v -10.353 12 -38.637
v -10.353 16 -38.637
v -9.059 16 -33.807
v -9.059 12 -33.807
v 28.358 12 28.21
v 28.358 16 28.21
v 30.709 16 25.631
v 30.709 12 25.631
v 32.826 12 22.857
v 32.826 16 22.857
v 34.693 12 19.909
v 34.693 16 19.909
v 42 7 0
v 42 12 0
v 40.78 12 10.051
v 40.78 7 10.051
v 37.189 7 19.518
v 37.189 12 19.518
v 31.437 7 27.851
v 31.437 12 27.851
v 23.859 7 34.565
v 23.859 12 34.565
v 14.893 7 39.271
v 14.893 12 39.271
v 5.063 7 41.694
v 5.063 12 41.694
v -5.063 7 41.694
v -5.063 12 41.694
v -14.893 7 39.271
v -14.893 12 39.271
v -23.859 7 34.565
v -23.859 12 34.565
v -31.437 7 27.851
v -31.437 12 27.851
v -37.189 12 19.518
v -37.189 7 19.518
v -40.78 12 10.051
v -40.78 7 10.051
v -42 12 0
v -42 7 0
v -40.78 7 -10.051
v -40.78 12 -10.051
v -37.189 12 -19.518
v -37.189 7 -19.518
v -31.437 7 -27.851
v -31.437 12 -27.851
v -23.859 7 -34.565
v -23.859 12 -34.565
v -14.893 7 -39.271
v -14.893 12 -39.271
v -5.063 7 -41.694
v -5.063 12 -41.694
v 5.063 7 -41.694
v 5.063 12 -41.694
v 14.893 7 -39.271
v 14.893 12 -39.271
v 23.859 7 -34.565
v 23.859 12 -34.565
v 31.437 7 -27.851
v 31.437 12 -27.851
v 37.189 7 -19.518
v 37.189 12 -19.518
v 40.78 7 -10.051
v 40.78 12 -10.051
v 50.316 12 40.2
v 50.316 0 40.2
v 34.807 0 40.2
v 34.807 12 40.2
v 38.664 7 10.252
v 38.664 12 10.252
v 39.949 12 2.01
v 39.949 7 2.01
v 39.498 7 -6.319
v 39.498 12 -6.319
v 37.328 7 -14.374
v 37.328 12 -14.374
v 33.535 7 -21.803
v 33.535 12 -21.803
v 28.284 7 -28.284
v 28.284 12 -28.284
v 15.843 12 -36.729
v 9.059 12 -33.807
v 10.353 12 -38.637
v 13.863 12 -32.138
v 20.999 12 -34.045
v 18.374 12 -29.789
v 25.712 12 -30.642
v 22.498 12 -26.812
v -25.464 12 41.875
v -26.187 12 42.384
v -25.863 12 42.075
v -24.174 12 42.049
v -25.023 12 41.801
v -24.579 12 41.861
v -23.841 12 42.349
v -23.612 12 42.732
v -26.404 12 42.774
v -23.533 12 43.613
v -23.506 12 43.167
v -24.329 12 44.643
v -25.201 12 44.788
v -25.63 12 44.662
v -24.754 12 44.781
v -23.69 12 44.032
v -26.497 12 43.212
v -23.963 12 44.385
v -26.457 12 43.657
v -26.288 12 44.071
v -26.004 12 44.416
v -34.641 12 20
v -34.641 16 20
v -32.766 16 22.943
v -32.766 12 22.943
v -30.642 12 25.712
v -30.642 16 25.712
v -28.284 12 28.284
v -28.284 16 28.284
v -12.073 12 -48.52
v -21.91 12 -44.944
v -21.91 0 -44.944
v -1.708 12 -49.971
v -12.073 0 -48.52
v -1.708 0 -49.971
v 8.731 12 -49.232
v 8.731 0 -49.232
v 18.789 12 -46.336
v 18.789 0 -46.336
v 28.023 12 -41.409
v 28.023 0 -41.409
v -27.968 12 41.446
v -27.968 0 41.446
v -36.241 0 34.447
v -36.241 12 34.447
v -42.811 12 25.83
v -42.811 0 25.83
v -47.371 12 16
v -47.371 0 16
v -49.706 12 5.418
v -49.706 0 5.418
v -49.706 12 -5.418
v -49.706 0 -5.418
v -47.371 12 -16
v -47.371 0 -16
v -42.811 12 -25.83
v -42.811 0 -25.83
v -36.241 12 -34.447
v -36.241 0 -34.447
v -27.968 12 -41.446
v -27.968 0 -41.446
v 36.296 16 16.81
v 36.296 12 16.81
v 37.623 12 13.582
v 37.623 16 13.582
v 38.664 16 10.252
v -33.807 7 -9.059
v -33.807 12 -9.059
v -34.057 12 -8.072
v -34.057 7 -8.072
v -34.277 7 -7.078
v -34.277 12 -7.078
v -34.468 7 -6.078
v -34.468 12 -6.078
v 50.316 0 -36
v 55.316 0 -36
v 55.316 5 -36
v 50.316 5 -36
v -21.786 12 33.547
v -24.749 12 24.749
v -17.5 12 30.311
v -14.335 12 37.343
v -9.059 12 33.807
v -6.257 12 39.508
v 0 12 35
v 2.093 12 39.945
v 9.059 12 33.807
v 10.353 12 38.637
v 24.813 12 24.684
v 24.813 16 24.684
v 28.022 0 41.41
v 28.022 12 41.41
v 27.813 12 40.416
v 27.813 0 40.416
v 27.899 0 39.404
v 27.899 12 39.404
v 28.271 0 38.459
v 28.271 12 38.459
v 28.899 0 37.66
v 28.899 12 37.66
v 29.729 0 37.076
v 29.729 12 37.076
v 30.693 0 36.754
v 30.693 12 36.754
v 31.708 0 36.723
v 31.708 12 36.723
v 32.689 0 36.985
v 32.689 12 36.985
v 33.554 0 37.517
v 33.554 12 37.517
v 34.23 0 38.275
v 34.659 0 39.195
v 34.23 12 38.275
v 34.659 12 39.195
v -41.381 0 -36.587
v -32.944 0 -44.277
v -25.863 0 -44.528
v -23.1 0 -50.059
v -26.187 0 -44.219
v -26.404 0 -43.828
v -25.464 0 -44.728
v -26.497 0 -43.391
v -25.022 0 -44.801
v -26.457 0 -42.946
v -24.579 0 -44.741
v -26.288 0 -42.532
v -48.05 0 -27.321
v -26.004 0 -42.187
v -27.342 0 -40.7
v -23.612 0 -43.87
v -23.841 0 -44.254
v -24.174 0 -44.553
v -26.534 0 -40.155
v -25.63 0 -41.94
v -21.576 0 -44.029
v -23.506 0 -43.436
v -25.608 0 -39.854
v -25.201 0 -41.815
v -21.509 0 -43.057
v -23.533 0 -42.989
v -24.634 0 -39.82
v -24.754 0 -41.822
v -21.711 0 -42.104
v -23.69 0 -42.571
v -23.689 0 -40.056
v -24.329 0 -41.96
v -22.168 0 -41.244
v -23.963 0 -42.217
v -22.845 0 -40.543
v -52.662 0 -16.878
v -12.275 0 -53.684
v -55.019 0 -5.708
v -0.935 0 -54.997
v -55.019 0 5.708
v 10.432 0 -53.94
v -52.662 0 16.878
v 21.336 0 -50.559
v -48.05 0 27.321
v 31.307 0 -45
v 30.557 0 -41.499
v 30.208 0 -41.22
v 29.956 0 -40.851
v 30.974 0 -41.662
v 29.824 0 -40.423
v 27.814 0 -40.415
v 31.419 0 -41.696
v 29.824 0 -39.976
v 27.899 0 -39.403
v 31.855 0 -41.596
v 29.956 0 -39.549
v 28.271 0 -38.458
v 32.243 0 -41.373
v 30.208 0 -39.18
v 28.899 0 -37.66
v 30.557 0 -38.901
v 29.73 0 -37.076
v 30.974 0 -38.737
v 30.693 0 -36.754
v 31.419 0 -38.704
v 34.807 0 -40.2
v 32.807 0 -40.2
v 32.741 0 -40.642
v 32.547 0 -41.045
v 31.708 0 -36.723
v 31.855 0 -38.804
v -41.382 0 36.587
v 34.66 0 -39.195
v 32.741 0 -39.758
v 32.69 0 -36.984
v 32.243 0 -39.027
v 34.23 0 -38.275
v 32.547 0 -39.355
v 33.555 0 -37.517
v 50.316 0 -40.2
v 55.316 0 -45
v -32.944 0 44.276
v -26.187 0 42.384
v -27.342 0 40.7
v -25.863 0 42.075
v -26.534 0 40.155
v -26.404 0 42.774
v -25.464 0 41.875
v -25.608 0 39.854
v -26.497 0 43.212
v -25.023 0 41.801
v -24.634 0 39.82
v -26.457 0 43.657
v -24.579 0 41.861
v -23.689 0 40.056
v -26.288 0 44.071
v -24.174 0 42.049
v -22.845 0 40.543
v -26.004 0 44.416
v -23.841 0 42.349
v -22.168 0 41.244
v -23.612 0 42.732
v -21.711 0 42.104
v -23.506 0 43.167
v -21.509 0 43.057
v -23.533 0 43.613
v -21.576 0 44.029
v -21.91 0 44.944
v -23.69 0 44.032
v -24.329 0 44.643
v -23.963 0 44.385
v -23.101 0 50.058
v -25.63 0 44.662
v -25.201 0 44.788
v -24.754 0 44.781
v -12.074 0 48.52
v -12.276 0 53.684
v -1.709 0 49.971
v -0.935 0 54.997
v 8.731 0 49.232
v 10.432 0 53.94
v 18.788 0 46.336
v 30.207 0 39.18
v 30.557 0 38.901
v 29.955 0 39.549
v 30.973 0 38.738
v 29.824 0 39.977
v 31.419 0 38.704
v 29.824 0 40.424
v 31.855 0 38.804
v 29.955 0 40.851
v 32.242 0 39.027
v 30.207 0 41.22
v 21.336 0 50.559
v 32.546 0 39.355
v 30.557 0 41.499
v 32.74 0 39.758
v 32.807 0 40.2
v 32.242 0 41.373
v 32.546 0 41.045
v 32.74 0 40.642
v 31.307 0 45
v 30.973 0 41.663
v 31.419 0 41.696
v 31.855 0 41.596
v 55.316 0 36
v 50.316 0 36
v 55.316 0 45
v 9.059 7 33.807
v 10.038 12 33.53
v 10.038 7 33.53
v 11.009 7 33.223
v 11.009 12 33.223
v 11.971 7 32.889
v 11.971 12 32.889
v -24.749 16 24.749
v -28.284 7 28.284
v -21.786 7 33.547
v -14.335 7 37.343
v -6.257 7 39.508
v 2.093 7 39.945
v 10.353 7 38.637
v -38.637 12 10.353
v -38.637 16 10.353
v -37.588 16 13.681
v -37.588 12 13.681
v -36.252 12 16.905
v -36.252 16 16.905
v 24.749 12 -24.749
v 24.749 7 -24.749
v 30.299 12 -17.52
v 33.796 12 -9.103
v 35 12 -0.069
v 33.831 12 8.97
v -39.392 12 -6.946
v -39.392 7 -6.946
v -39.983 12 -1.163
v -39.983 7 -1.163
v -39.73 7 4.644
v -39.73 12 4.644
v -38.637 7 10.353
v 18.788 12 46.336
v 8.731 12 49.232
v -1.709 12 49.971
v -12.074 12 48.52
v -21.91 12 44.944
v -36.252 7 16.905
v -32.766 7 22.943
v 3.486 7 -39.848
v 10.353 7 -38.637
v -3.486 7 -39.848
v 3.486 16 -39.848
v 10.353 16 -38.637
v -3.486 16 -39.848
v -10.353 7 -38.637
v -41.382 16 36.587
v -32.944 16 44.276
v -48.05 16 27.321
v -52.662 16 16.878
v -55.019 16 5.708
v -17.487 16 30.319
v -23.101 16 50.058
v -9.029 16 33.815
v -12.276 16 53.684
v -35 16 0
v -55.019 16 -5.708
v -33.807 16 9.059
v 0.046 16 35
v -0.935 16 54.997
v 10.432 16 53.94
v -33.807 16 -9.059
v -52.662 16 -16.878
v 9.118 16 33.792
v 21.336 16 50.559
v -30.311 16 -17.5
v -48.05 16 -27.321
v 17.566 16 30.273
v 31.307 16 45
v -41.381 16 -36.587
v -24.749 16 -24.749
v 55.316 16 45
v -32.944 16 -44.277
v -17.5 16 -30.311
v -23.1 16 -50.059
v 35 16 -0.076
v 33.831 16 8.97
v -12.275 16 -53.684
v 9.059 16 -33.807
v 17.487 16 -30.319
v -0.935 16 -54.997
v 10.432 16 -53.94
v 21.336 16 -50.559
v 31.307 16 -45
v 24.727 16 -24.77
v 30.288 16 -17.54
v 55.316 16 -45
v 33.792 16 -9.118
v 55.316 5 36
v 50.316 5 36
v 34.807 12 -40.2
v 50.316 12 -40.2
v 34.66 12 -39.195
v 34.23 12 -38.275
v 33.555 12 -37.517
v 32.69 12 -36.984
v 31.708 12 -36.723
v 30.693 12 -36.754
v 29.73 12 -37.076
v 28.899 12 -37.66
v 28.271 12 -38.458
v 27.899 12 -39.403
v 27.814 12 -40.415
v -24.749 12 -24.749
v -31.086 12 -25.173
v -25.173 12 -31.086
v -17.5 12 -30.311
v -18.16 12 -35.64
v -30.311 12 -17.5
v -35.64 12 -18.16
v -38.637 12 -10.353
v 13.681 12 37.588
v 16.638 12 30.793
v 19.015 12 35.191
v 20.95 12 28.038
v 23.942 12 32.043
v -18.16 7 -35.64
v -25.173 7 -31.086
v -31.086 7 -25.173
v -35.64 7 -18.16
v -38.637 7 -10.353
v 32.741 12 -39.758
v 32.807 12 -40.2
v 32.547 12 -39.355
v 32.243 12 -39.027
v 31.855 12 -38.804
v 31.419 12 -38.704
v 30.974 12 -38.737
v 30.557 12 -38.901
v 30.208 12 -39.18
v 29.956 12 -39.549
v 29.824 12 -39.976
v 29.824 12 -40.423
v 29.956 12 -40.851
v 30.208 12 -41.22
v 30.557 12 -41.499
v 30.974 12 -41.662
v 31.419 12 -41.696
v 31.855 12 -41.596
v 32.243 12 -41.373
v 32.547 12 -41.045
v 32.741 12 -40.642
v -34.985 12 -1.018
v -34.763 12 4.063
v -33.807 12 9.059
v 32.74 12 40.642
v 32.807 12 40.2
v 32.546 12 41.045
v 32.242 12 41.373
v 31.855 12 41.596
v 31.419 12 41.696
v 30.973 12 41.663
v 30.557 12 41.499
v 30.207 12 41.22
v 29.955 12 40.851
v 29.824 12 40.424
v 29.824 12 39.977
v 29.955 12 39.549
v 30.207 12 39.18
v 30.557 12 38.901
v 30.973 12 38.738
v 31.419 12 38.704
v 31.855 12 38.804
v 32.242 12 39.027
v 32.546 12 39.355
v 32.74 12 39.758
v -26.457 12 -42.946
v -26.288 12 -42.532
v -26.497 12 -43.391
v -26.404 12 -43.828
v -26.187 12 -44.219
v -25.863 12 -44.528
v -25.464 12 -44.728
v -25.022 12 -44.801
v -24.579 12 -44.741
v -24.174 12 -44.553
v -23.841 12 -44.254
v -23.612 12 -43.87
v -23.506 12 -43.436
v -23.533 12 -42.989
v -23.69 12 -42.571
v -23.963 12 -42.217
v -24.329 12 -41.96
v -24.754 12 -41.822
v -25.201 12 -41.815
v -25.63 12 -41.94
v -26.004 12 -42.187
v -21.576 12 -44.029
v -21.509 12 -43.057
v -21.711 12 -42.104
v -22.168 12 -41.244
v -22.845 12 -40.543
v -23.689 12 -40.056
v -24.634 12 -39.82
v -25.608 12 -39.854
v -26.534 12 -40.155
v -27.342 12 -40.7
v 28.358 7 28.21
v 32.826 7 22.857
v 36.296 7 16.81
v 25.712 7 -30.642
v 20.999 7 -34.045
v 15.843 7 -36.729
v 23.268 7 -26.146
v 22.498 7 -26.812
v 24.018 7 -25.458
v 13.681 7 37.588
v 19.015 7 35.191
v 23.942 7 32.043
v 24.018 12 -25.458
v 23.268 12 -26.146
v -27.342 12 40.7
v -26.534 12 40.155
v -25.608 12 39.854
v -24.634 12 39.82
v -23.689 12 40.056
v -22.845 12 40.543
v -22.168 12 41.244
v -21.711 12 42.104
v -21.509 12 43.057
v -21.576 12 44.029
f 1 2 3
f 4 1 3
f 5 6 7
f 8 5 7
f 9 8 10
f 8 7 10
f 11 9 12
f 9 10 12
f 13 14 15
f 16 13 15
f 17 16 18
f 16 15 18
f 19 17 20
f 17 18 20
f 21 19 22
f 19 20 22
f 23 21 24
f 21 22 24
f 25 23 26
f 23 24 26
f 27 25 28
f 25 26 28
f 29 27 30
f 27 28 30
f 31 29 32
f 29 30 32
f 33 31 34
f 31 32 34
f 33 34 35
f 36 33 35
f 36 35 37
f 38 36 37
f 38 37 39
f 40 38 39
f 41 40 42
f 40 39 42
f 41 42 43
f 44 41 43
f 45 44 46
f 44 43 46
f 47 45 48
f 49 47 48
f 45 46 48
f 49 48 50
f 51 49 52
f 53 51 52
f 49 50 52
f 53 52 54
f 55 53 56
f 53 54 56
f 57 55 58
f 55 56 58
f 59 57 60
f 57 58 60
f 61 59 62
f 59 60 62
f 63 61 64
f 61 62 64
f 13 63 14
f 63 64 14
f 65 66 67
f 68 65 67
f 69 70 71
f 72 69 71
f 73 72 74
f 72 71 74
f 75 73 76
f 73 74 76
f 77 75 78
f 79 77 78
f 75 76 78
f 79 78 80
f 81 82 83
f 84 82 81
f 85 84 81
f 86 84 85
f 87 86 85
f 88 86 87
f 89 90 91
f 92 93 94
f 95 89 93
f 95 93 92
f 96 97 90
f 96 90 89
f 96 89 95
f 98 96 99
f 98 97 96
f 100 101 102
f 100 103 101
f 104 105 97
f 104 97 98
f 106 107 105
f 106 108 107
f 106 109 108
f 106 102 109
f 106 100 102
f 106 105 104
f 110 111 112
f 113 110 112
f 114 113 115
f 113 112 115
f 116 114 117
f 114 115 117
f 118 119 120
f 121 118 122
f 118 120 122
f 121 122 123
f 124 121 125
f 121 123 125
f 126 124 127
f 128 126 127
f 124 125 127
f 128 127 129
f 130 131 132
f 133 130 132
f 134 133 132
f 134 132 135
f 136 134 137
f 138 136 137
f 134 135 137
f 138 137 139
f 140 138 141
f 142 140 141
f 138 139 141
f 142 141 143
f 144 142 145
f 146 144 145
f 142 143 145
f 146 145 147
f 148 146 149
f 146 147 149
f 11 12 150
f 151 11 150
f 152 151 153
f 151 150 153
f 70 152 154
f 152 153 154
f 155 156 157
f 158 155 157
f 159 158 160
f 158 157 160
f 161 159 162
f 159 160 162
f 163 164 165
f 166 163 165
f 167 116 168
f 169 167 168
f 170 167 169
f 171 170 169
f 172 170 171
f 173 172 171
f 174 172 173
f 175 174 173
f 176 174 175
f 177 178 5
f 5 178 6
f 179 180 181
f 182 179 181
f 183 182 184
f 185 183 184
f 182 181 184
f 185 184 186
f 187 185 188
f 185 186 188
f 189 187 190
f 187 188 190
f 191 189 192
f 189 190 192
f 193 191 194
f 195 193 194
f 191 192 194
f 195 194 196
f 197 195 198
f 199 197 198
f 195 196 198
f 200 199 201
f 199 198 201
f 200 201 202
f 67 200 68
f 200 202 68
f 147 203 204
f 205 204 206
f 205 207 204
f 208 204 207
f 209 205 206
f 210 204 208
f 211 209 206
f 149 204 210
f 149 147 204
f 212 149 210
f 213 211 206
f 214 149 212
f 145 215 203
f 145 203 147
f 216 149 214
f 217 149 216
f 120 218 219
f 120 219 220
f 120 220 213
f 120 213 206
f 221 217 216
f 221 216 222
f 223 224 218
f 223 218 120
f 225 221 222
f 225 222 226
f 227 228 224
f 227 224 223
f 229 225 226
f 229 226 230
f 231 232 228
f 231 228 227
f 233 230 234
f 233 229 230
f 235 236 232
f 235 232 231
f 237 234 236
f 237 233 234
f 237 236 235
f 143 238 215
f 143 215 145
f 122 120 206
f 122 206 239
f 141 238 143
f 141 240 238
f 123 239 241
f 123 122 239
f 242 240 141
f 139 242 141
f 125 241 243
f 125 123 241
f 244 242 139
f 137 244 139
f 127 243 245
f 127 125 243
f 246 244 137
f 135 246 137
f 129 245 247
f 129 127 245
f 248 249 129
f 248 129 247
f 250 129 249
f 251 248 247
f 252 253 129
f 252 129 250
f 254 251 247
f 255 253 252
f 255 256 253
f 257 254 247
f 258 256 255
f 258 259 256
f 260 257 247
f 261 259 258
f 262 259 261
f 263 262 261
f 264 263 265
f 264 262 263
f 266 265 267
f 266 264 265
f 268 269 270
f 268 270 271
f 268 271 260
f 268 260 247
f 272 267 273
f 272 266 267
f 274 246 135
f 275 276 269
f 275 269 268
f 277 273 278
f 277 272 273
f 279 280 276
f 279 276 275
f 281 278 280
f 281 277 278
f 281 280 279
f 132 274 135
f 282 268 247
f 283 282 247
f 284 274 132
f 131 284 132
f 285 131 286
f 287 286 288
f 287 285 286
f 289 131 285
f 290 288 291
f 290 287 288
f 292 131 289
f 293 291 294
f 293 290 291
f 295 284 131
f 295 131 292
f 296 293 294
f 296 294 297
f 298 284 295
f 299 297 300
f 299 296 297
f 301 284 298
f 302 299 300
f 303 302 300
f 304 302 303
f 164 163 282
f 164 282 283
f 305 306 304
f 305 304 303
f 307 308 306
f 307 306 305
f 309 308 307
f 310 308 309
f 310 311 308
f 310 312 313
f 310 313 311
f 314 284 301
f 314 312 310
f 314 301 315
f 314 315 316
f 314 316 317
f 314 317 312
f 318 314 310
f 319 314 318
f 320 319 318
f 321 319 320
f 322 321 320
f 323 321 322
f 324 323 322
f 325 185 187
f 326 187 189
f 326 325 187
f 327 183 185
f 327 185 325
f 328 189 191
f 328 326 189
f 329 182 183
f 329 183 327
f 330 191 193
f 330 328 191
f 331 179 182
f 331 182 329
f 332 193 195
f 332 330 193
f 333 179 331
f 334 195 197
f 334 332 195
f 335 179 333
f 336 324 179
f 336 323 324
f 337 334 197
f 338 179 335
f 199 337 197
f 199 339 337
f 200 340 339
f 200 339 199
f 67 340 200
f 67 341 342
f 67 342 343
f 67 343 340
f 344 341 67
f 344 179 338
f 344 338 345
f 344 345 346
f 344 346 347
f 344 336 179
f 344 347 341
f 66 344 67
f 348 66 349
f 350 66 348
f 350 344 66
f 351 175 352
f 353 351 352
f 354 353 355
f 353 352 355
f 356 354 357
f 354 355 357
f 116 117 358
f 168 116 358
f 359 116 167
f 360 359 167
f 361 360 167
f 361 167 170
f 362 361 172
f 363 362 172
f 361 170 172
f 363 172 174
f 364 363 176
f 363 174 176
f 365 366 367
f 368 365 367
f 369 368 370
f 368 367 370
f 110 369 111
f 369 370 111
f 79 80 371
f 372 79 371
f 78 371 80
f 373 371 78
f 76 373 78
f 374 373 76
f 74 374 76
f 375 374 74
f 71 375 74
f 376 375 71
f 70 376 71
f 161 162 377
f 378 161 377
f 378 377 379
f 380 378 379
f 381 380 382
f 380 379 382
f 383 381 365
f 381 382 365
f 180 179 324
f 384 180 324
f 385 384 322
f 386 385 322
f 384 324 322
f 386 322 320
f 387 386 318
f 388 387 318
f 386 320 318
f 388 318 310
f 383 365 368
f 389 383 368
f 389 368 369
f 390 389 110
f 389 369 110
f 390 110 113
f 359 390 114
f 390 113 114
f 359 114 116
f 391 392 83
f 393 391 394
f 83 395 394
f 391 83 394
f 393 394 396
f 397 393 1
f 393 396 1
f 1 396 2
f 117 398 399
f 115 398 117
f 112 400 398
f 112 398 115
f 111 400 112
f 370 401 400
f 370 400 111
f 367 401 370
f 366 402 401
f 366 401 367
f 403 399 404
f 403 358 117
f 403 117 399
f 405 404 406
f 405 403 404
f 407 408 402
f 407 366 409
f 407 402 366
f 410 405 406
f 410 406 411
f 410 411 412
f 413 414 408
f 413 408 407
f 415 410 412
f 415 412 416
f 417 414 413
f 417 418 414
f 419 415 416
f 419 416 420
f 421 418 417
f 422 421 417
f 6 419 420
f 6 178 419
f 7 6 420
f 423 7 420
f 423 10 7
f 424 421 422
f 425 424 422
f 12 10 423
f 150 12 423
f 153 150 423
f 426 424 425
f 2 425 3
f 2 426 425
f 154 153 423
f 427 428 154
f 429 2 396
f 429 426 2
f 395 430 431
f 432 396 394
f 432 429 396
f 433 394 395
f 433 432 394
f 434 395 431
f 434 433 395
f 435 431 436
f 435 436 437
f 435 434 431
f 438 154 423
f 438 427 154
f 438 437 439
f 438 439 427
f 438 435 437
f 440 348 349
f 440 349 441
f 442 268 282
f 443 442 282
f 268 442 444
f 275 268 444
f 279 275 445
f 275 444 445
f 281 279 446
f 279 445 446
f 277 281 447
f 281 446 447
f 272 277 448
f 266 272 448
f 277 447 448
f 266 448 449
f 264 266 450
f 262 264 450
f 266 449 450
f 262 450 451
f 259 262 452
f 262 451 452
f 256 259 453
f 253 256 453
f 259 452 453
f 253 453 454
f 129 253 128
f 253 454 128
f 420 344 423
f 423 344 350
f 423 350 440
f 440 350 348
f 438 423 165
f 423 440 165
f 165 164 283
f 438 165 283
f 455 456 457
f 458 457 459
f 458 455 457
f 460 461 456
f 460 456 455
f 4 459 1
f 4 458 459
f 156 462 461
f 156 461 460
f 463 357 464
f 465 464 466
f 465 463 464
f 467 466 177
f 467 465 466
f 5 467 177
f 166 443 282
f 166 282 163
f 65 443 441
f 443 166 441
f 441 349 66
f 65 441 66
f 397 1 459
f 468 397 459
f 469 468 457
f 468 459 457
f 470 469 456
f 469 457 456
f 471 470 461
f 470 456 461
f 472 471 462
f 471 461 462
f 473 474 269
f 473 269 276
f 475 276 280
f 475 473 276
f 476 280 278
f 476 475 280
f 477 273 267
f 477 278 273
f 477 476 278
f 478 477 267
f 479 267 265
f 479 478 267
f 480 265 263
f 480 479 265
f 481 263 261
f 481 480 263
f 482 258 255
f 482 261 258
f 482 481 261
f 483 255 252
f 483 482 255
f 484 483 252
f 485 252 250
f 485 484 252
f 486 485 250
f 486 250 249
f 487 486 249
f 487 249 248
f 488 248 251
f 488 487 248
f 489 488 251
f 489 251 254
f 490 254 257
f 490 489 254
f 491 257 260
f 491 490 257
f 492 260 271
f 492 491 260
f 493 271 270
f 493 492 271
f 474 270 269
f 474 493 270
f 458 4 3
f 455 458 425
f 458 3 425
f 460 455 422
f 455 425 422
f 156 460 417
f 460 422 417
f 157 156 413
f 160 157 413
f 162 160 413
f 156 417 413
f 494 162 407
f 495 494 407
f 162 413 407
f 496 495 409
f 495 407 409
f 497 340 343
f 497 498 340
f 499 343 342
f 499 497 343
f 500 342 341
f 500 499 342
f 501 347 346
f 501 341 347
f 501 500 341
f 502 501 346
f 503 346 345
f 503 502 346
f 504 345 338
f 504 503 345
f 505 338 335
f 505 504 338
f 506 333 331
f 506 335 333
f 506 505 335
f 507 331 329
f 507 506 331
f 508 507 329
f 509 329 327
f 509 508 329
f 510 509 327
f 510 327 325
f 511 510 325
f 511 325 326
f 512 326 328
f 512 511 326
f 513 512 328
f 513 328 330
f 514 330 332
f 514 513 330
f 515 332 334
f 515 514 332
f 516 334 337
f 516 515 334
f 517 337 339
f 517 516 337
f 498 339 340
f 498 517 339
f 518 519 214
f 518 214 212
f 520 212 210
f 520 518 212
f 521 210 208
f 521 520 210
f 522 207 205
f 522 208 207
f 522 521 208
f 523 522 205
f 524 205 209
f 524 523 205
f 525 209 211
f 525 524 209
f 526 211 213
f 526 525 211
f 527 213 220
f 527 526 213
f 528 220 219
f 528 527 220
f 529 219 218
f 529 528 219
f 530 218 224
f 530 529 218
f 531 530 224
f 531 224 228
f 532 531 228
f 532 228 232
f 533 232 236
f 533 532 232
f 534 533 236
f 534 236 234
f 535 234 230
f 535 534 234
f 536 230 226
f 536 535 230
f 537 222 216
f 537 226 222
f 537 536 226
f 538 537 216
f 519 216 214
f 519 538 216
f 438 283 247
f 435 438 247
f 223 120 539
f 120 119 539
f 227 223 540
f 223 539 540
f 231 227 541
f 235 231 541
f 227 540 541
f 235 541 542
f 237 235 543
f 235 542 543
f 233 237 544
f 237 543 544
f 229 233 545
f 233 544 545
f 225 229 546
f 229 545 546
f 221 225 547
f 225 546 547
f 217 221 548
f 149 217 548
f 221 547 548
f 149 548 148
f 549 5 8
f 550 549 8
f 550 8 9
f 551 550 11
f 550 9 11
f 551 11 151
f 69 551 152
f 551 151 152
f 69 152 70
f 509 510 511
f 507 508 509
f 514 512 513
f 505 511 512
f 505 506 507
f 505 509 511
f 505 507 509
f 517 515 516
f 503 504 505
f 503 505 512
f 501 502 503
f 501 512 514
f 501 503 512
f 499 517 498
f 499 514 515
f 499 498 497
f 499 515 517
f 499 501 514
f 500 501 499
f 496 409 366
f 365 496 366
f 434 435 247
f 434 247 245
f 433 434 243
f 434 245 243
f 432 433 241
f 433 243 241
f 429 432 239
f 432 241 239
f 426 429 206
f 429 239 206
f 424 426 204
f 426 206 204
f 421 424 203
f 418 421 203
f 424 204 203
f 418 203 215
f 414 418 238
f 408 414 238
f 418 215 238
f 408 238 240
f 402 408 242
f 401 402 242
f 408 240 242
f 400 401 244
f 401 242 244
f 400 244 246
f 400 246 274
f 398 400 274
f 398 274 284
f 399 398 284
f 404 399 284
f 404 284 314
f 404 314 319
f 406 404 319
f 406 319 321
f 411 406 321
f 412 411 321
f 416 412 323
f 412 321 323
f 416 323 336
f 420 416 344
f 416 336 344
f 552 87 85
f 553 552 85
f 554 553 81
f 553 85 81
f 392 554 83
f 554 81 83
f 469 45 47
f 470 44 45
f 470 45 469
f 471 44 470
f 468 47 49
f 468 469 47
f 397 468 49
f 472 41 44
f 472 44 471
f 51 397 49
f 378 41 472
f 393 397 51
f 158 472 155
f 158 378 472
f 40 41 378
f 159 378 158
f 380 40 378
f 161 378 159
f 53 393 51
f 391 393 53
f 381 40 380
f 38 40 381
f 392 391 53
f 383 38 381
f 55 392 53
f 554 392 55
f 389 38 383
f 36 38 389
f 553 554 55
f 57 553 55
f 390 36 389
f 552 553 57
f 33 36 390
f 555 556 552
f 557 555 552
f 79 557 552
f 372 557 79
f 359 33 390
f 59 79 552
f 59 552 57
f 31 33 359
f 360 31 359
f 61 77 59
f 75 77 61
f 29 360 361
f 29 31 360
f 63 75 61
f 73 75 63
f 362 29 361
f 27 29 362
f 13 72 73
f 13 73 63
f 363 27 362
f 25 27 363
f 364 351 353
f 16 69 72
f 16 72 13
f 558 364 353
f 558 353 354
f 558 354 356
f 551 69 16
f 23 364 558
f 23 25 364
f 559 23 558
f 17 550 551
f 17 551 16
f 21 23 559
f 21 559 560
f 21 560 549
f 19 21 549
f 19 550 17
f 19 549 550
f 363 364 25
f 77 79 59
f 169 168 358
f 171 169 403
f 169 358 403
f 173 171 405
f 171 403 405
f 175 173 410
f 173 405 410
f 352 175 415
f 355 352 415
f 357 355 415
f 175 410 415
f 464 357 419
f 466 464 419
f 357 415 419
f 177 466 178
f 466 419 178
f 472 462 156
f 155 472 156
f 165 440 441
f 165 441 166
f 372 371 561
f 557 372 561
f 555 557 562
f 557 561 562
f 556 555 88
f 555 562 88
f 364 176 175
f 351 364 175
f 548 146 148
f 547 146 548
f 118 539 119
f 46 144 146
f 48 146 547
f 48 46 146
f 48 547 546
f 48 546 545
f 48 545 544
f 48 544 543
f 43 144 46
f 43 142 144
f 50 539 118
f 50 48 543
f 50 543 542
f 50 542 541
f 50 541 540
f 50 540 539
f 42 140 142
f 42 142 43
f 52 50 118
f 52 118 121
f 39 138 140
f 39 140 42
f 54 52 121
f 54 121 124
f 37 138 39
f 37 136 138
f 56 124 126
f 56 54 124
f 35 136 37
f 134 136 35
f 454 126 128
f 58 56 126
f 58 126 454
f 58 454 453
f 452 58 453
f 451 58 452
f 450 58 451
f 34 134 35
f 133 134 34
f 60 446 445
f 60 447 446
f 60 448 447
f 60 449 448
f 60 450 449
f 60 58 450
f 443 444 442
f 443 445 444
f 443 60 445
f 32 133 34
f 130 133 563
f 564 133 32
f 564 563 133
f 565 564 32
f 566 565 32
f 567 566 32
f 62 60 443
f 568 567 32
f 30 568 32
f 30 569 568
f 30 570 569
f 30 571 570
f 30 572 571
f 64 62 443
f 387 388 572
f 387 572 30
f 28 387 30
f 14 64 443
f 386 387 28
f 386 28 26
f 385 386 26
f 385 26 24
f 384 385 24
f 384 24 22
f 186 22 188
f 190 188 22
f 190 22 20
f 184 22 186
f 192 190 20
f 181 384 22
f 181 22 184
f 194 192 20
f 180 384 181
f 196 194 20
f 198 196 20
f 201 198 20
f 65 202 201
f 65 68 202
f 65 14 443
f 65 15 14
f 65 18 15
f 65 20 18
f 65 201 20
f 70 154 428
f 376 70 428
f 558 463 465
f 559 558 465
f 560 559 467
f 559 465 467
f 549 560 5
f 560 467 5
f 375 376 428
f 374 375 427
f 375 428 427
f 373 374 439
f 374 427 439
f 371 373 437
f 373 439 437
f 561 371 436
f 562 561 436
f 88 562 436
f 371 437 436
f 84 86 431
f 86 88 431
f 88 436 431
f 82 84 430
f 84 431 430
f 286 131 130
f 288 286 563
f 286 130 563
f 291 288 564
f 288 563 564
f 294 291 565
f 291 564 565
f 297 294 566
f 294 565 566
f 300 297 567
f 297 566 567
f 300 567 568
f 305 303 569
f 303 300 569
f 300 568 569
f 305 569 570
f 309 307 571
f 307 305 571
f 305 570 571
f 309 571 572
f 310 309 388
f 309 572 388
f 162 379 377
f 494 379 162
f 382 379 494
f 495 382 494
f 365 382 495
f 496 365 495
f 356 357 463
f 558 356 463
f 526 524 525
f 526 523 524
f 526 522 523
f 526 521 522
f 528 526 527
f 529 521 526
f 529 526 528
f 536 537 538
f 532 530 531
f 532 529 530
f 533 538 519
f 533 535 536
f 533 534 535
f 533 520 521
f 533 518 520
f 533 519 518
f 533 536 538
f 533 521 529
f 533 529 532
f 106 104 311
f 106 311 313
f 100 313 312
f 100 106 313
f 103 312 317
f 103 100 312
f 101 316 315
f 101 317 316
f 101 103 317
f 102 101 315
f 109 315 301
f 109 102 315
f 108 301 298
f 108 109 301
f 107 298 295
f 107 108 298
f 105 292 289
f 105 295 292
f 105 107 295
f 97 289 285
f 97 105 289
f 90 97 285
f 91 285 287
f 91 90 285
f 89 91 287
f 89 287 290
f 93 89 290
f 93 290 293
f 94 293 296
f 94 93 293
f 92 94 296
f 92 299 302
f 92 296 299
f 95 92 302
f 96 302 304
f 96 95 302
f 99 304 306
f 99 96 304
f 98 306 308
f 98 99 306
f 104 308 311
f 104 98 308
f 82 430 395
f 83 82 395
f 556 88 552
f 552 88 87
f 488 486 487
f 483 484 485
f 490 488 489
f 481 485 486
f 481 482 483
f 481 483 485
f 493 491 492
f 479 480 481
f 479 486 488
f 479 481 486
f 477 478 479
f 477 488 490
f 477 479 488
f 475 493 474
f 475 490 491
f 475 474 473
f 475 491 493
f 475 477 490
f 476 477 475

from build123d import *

# Parameters (mm, degrees)
BOSS_EXTRUDE1_DEPTH = 16
CUT_EXTRUDE1_DEPTH  = 12
SKETCH4_W           = 72
SKETCH4_H           = 5
CUT_EXTRUDE2_DEPTH  = 16
SKETCH5_R           = 35
CUT_EXTRUDE3_DEPTH  = 16
CUT_EXTRUDE4_DEPTH  = 10
SKETCH7_R           = 42
BOSS_EXTRUDE2_DEPTH = 5
SKETCH8_R           = 3.5
SKETCH8_R_2         = 1.5
BOSS_EXTRUDE3_DEPTH = 12
SKETCH9_R           = 1.5
CUT_EXTRUDE5_DEPTH  = 12


with BuildPart() as part:
    # Sketch1 → Boss-Extrude1 (new body)
    with BuildSketch(Plane(origin=(0, 0, 0), x_dir=(1, 0, 0), z_dir=(0, 1, 0))):
        with BuildLine():
            Line((24.684271836, -45.0001724), (24.684271836, 44.9998276))
            Line((24.684271836, 44.9998276), (31.307293766, 44.9998276))
            ThreePointArc((31.307293766, 44.9998276), (-55.315728163, 0.000299848), (31.306803106, -45.0001724))
            Line((31.306803106, -45.0001724), (24.684271836, -45.0001724))
        make_face()
        with BuildLine():
            Line((31.307293766, 44.9998276), (24.684271836, 44.9998276))
            Line((24.684271836, 44.9998276), (24.684271836, -45.0001724))
            Line((24.684271836, -45.0001724), (31.306803106, -45.0001724))
            ThreePointArc((31.306803106, -45.0001724), (48.491234556, -25.355086079), (54.684271836, 0))
            ThreePointArc((54.684271836, 0), (48.491372785, 25.354819994), (31.307293766, 44.9998276))
        make_face()
        with BuildLine():
            Line((55.315728164, 44.9998276), (31.307293766, 44.9998276))
            ThreePointArc((31.307293766, 44.9998276), (48.491372785, 25.354819994), (54.684271836, 0))
            ThreePointArc((54.684271836, 0), (48.491234556, -25.355086079), (31.306803106, -45.0001724))
            Line((31.306803106, -45.0001724), (55.315728164, -45.0001724))
            Line((55.315728164, -45.0001724), (55.315728164, 44.9998276))
        make_face()
    extrude(amount=BOSS_EXTRUDE1_DEPTH)

    # Sketch3 → Cut-Extrude1 (cut)
    with BuildSketch(Plane.XZ):
        with BuildLine():
            ThreePointArc((50, 0), (44.646173327, 22.510424413), (29.73123171, 40.2001724))
            Line((29.73123171, 40.2001724), (13.648760289, 40.2001724))
            Line((13.648760289, 40.2001724), (13.648760289, -40.1998276))
            Line((13.648760289, -40.1998276), (29.731697916, -40.1998276))
            ThreePointArc((29.731697916, -40.1998276), (44.646303855, -22.510165528), (50, 0))
        make_face()
        with BuildLine():
            Line((13.648760289, 40.2001724), (29.73123171, 40.2001724))
            ThreePointArc((29.73123171, 40.2001724), (-49.999999999, -0.000289929), (29.731697916, -40.1998276))
            Line((29.731697916, -40.1998276), (13.648760289, -40.1998276))
            Line((13.648760289, -40.1998276), (13.648760289, 40.2001724))
        make_face()
        with BuildLine():
            Line((50.315728164, -40.1998276), (50.315728164, 40.2001724))
            Line((50.315728164, 40.2001724), (29.73123171, 40.2001724))
            ThreePointArc((29.73123171, 40.2001724), (44.646173327, 22.510424413), (50, 0))
            ThreePointArc((50, 0), (44.646303855, -22.510165528), (29.731697916, -40.1998276))
            Line((29.731697916, -40.1998276), (50.315728164, -40.1998276))
        make_face()
    extrude(amount=-CUT_EXTRUDE1_DEPTH, mode=Mode.SUBTRACT)

    # Sketch4 → Cut-Extrude2 (cut)
    with BuildSketch(Plane(origin=(55.315728164, 0, 0), x_dir=(0, 0, -1), z_dir=(1, 0, 0))):
        with Locations((-0.0001724, 2.5)):
            Rectangle(SKETCH4_W, SKETCH4_H)
    extrude(amount=-CUT_EXTRUDE2_DEPTH, mode=Mode.SUBTRACT)

    # Sketch5 → Cut-Extrude3 (cut)
    with BuildSketch(Plane(origin=(0, 16, 0), x_dir=(1, 0, 0), z_dir=(0, 1, 0))):
        Circle(SKETCH5_R)
    extrude(amount=-CUT_EXTRUDE3_DEPTH, mode=Mode.SUBTRACT)

    # Sketch6 → Cut-Extrude4 (cut)
    with BuildSketch(Plane(origin=(0, 16, 0), x_dir=(1, 0, 0), z_dir=(0, 1, 0))):
        with BuildLine():
            Line((-28.284271247, -28.284271247), (-24.748737342, -24.748737342))
            ThreePointArc((-24.748737342, -24.748737342), (-27.76736691, -21.306650015), (-30.310889132, -17.5))
            Line((-30.310889132, -17.5), (-34.641016151, -20))
            ThreePointArc((-34.641016151, -20), (-31.734133612, -24.35045716), (-28.284271247, -28.284271247))
        make_face()
        with BuildLine():
            Line((-34.641016151, -20), (-30.310889132, -17.5))
            ThreePointArc((-30.310889132, -17.5), (-32.335783638, -13.393920133), (-33.80740392, -9.058666579))
            Line((-33.80740392, -9.058666579), (-38.637033052, -10.352761804))
            ThreePointArc((-38.637033052, -10.352761804), (-36.9551813, -15.307337295), (-34.641016151, -20))
        make_face()
        with BuildLine():
            Line((-10.352761804, 38.637033052), (-9.058666579, 33.80740392))
            ThreePointArc((-9.058666579, 33.80740392), (0, 35), (9.058666579, 33.80740392))
            Line((9.058666579, 33.80740392), (10.352761804, 38.637033052))
            ThreePointArc((10.352761804, 38.637033052), (0, 40), (-10.352761804, 38.637033052))
        make_face()
        with BuildLine():
            ThreePointArc((33.831018509, -8.970071717), (32.370760151, -13.309165535), (30.356629112, -17.420535841))
            Line((30.356629112, -17.420535841), (34.693290413, -19.909183818))
            ThreePointArc((34.693290413, -19.909183818), (36.995154458, -15.210474897), (38.664021154, -10.251510534))
            Line((38.664021154, -10.251510534), (33.831018509, -8.970071717))
        make_face()
        with BuildLine():
            ThreePointArc((30.356629112, -17.420535841), (27.823087732, -21.233835948), (24.813485607, -24.683819236))
            Line((24.813485607, -24.683819236), (28.358269265, -28.210079126))
            ThreePointArc((28.358269265, -28.210079126), (31.79781455, -24.267241084), (34.693290413, -19.909183818))
            Line((34.693290413, -19.909183818), (30.356629112, -17.420535841))
        make_face()
    extrude(amount=-CUT_EXTRUDE4_DEPTH, mode=Mode.SUBTRACT)

    # Sketch7 → Boss-Extrude2 (add)
    with BuildSketch(Plane.XZ.offset(-12)):
        Circle(SKETCH7_R)
        with BuildLine():
            ThreePointArc((-28.284271247, 28.284271247), (-10.352761804, 38.637033052), (10.352761804, 38.637033052))
            Line((10.352761804, 38.637033052), (9.058666579, 33.80740392))
            ThreePointArc((9.058666579, 33.80740392), (10.524702983, 33.380093276), (11.970705016, 32.889241728))
            Line((11.970705016, 32.889241728), (13.680805733, 37.587704831))
            ThreePointArc((13.680805733, 37.587704831), (21.53615385, 33.707478063), (28.358269265, 28.210079126))
            ThreePointArc((28.358269265, 28.210079126), (34.693290413, 19.909183818), (38.664021154, 10.251510534))
            ThreePointArc((38.664021154, 10.251510534), (38.623439557, -10.40336084), (28.284271247, -28.284271247))
            Line((28.284271247, -28.284271247), (24.748737342, -24.748737342))
            ThreePointArc((24.748737342, -24.748737342), (23.645657267, -25.804706788), (22.497566339, -26.811555509))
            Line((22.497566339, -26.811555509), (25.711504387, -30.641777725))
            ThreePointArc((25.711504387, -30.641777725), (18.469944529, -35.480433327), (10.352761804, -38.637033052))
            ThreePointArc((10.352761804, -38.637033052), (0, -40), (-10.352761804, -38.637033052))
            ThreePointArc((-10.352761804, -38.637033052), (-28.284271247, -28.284271247), (-38.637033052, -10.352761804))
            Line((-38.637033052, -10.352761804), (-33.80740392, -9.058666579))
            ThreePointArc((-33.80740392, -9.058666579), (-34.170360249, -7.575386488), (-34.468271355, -6.077686218))
            Line((-34.468271355, -6.077686218), (-39.39231012, -6.945927107))
            ThreePointArc((-39.39231012, -6.945927107), (-39.961928863, 1.744775495), (-38.637033052, 10.352761804))
            ThreePointArc((-38.637033052, 10.352761804), (-34.641016151, 20), (-28.284271247, 28.284271247))
        make_face(mode=Mode.SUBTRACT)
    extrude(amount=BOSS_EXTRUDE2_DEPTH)

    # Sketch8 → Boss-Extrude3 (add)
    with BuildSketch(Plane.XZ.offset(-12)):
        with Locations((-25, 43.301270189)):
            Circle(SKETCH8_R)
        with Locations((-25, 43.301270189)):
            Circle(SKETCH8_R_2, mode=Mode.SUBTRACT)
        with Locations((-25, -43.301270189)):
            Circle(SKETCH8_R)
        with Locations((-25, -43.301270189)):
            Circle(SKETCH8_R_2, mode=Mode.SUBTRACT)
        with Locations((31.306803106, 40.2001724)):
            Circle(SKETCH8_R)
        with Locations((31.306803106, 40.2001724)):
            Circle(SKETCH8_R_2, mode=Mode.SUBTRACT)
        with Locations((31.307293766, -40.1998276)):
            Circle(SKETCH8_R)
        with Locations((31.307293766, -40.1998276)):
            Circle(SKETCH8_R_2, mode=Mode.SUBTRACT)
    extrude(amount=BOSS_EXTRUDE3_DEPTH)

    # Sketch9 → Cut-Extrude5 (cut)
    with BuildSketch(Plane.XZ.offset(-12)):
        with Locations((-25, 43.301270189)):
            Circle(SKETCH9_R)
        with Locations((31.306803106, 40.2001724)):
            Circle(SKETCH9_R)
        with Locations((-25, -43.301270189)):
            Circle(SKETCH9_R)
        with Locations((31.307293766, -40.1998276)):
            Circle(SKETCH9_R)
    extrude(amount=CUT_EXTRUDE5_DEPTH, mode=Mode.SUBTRACT)


solid = part.part
